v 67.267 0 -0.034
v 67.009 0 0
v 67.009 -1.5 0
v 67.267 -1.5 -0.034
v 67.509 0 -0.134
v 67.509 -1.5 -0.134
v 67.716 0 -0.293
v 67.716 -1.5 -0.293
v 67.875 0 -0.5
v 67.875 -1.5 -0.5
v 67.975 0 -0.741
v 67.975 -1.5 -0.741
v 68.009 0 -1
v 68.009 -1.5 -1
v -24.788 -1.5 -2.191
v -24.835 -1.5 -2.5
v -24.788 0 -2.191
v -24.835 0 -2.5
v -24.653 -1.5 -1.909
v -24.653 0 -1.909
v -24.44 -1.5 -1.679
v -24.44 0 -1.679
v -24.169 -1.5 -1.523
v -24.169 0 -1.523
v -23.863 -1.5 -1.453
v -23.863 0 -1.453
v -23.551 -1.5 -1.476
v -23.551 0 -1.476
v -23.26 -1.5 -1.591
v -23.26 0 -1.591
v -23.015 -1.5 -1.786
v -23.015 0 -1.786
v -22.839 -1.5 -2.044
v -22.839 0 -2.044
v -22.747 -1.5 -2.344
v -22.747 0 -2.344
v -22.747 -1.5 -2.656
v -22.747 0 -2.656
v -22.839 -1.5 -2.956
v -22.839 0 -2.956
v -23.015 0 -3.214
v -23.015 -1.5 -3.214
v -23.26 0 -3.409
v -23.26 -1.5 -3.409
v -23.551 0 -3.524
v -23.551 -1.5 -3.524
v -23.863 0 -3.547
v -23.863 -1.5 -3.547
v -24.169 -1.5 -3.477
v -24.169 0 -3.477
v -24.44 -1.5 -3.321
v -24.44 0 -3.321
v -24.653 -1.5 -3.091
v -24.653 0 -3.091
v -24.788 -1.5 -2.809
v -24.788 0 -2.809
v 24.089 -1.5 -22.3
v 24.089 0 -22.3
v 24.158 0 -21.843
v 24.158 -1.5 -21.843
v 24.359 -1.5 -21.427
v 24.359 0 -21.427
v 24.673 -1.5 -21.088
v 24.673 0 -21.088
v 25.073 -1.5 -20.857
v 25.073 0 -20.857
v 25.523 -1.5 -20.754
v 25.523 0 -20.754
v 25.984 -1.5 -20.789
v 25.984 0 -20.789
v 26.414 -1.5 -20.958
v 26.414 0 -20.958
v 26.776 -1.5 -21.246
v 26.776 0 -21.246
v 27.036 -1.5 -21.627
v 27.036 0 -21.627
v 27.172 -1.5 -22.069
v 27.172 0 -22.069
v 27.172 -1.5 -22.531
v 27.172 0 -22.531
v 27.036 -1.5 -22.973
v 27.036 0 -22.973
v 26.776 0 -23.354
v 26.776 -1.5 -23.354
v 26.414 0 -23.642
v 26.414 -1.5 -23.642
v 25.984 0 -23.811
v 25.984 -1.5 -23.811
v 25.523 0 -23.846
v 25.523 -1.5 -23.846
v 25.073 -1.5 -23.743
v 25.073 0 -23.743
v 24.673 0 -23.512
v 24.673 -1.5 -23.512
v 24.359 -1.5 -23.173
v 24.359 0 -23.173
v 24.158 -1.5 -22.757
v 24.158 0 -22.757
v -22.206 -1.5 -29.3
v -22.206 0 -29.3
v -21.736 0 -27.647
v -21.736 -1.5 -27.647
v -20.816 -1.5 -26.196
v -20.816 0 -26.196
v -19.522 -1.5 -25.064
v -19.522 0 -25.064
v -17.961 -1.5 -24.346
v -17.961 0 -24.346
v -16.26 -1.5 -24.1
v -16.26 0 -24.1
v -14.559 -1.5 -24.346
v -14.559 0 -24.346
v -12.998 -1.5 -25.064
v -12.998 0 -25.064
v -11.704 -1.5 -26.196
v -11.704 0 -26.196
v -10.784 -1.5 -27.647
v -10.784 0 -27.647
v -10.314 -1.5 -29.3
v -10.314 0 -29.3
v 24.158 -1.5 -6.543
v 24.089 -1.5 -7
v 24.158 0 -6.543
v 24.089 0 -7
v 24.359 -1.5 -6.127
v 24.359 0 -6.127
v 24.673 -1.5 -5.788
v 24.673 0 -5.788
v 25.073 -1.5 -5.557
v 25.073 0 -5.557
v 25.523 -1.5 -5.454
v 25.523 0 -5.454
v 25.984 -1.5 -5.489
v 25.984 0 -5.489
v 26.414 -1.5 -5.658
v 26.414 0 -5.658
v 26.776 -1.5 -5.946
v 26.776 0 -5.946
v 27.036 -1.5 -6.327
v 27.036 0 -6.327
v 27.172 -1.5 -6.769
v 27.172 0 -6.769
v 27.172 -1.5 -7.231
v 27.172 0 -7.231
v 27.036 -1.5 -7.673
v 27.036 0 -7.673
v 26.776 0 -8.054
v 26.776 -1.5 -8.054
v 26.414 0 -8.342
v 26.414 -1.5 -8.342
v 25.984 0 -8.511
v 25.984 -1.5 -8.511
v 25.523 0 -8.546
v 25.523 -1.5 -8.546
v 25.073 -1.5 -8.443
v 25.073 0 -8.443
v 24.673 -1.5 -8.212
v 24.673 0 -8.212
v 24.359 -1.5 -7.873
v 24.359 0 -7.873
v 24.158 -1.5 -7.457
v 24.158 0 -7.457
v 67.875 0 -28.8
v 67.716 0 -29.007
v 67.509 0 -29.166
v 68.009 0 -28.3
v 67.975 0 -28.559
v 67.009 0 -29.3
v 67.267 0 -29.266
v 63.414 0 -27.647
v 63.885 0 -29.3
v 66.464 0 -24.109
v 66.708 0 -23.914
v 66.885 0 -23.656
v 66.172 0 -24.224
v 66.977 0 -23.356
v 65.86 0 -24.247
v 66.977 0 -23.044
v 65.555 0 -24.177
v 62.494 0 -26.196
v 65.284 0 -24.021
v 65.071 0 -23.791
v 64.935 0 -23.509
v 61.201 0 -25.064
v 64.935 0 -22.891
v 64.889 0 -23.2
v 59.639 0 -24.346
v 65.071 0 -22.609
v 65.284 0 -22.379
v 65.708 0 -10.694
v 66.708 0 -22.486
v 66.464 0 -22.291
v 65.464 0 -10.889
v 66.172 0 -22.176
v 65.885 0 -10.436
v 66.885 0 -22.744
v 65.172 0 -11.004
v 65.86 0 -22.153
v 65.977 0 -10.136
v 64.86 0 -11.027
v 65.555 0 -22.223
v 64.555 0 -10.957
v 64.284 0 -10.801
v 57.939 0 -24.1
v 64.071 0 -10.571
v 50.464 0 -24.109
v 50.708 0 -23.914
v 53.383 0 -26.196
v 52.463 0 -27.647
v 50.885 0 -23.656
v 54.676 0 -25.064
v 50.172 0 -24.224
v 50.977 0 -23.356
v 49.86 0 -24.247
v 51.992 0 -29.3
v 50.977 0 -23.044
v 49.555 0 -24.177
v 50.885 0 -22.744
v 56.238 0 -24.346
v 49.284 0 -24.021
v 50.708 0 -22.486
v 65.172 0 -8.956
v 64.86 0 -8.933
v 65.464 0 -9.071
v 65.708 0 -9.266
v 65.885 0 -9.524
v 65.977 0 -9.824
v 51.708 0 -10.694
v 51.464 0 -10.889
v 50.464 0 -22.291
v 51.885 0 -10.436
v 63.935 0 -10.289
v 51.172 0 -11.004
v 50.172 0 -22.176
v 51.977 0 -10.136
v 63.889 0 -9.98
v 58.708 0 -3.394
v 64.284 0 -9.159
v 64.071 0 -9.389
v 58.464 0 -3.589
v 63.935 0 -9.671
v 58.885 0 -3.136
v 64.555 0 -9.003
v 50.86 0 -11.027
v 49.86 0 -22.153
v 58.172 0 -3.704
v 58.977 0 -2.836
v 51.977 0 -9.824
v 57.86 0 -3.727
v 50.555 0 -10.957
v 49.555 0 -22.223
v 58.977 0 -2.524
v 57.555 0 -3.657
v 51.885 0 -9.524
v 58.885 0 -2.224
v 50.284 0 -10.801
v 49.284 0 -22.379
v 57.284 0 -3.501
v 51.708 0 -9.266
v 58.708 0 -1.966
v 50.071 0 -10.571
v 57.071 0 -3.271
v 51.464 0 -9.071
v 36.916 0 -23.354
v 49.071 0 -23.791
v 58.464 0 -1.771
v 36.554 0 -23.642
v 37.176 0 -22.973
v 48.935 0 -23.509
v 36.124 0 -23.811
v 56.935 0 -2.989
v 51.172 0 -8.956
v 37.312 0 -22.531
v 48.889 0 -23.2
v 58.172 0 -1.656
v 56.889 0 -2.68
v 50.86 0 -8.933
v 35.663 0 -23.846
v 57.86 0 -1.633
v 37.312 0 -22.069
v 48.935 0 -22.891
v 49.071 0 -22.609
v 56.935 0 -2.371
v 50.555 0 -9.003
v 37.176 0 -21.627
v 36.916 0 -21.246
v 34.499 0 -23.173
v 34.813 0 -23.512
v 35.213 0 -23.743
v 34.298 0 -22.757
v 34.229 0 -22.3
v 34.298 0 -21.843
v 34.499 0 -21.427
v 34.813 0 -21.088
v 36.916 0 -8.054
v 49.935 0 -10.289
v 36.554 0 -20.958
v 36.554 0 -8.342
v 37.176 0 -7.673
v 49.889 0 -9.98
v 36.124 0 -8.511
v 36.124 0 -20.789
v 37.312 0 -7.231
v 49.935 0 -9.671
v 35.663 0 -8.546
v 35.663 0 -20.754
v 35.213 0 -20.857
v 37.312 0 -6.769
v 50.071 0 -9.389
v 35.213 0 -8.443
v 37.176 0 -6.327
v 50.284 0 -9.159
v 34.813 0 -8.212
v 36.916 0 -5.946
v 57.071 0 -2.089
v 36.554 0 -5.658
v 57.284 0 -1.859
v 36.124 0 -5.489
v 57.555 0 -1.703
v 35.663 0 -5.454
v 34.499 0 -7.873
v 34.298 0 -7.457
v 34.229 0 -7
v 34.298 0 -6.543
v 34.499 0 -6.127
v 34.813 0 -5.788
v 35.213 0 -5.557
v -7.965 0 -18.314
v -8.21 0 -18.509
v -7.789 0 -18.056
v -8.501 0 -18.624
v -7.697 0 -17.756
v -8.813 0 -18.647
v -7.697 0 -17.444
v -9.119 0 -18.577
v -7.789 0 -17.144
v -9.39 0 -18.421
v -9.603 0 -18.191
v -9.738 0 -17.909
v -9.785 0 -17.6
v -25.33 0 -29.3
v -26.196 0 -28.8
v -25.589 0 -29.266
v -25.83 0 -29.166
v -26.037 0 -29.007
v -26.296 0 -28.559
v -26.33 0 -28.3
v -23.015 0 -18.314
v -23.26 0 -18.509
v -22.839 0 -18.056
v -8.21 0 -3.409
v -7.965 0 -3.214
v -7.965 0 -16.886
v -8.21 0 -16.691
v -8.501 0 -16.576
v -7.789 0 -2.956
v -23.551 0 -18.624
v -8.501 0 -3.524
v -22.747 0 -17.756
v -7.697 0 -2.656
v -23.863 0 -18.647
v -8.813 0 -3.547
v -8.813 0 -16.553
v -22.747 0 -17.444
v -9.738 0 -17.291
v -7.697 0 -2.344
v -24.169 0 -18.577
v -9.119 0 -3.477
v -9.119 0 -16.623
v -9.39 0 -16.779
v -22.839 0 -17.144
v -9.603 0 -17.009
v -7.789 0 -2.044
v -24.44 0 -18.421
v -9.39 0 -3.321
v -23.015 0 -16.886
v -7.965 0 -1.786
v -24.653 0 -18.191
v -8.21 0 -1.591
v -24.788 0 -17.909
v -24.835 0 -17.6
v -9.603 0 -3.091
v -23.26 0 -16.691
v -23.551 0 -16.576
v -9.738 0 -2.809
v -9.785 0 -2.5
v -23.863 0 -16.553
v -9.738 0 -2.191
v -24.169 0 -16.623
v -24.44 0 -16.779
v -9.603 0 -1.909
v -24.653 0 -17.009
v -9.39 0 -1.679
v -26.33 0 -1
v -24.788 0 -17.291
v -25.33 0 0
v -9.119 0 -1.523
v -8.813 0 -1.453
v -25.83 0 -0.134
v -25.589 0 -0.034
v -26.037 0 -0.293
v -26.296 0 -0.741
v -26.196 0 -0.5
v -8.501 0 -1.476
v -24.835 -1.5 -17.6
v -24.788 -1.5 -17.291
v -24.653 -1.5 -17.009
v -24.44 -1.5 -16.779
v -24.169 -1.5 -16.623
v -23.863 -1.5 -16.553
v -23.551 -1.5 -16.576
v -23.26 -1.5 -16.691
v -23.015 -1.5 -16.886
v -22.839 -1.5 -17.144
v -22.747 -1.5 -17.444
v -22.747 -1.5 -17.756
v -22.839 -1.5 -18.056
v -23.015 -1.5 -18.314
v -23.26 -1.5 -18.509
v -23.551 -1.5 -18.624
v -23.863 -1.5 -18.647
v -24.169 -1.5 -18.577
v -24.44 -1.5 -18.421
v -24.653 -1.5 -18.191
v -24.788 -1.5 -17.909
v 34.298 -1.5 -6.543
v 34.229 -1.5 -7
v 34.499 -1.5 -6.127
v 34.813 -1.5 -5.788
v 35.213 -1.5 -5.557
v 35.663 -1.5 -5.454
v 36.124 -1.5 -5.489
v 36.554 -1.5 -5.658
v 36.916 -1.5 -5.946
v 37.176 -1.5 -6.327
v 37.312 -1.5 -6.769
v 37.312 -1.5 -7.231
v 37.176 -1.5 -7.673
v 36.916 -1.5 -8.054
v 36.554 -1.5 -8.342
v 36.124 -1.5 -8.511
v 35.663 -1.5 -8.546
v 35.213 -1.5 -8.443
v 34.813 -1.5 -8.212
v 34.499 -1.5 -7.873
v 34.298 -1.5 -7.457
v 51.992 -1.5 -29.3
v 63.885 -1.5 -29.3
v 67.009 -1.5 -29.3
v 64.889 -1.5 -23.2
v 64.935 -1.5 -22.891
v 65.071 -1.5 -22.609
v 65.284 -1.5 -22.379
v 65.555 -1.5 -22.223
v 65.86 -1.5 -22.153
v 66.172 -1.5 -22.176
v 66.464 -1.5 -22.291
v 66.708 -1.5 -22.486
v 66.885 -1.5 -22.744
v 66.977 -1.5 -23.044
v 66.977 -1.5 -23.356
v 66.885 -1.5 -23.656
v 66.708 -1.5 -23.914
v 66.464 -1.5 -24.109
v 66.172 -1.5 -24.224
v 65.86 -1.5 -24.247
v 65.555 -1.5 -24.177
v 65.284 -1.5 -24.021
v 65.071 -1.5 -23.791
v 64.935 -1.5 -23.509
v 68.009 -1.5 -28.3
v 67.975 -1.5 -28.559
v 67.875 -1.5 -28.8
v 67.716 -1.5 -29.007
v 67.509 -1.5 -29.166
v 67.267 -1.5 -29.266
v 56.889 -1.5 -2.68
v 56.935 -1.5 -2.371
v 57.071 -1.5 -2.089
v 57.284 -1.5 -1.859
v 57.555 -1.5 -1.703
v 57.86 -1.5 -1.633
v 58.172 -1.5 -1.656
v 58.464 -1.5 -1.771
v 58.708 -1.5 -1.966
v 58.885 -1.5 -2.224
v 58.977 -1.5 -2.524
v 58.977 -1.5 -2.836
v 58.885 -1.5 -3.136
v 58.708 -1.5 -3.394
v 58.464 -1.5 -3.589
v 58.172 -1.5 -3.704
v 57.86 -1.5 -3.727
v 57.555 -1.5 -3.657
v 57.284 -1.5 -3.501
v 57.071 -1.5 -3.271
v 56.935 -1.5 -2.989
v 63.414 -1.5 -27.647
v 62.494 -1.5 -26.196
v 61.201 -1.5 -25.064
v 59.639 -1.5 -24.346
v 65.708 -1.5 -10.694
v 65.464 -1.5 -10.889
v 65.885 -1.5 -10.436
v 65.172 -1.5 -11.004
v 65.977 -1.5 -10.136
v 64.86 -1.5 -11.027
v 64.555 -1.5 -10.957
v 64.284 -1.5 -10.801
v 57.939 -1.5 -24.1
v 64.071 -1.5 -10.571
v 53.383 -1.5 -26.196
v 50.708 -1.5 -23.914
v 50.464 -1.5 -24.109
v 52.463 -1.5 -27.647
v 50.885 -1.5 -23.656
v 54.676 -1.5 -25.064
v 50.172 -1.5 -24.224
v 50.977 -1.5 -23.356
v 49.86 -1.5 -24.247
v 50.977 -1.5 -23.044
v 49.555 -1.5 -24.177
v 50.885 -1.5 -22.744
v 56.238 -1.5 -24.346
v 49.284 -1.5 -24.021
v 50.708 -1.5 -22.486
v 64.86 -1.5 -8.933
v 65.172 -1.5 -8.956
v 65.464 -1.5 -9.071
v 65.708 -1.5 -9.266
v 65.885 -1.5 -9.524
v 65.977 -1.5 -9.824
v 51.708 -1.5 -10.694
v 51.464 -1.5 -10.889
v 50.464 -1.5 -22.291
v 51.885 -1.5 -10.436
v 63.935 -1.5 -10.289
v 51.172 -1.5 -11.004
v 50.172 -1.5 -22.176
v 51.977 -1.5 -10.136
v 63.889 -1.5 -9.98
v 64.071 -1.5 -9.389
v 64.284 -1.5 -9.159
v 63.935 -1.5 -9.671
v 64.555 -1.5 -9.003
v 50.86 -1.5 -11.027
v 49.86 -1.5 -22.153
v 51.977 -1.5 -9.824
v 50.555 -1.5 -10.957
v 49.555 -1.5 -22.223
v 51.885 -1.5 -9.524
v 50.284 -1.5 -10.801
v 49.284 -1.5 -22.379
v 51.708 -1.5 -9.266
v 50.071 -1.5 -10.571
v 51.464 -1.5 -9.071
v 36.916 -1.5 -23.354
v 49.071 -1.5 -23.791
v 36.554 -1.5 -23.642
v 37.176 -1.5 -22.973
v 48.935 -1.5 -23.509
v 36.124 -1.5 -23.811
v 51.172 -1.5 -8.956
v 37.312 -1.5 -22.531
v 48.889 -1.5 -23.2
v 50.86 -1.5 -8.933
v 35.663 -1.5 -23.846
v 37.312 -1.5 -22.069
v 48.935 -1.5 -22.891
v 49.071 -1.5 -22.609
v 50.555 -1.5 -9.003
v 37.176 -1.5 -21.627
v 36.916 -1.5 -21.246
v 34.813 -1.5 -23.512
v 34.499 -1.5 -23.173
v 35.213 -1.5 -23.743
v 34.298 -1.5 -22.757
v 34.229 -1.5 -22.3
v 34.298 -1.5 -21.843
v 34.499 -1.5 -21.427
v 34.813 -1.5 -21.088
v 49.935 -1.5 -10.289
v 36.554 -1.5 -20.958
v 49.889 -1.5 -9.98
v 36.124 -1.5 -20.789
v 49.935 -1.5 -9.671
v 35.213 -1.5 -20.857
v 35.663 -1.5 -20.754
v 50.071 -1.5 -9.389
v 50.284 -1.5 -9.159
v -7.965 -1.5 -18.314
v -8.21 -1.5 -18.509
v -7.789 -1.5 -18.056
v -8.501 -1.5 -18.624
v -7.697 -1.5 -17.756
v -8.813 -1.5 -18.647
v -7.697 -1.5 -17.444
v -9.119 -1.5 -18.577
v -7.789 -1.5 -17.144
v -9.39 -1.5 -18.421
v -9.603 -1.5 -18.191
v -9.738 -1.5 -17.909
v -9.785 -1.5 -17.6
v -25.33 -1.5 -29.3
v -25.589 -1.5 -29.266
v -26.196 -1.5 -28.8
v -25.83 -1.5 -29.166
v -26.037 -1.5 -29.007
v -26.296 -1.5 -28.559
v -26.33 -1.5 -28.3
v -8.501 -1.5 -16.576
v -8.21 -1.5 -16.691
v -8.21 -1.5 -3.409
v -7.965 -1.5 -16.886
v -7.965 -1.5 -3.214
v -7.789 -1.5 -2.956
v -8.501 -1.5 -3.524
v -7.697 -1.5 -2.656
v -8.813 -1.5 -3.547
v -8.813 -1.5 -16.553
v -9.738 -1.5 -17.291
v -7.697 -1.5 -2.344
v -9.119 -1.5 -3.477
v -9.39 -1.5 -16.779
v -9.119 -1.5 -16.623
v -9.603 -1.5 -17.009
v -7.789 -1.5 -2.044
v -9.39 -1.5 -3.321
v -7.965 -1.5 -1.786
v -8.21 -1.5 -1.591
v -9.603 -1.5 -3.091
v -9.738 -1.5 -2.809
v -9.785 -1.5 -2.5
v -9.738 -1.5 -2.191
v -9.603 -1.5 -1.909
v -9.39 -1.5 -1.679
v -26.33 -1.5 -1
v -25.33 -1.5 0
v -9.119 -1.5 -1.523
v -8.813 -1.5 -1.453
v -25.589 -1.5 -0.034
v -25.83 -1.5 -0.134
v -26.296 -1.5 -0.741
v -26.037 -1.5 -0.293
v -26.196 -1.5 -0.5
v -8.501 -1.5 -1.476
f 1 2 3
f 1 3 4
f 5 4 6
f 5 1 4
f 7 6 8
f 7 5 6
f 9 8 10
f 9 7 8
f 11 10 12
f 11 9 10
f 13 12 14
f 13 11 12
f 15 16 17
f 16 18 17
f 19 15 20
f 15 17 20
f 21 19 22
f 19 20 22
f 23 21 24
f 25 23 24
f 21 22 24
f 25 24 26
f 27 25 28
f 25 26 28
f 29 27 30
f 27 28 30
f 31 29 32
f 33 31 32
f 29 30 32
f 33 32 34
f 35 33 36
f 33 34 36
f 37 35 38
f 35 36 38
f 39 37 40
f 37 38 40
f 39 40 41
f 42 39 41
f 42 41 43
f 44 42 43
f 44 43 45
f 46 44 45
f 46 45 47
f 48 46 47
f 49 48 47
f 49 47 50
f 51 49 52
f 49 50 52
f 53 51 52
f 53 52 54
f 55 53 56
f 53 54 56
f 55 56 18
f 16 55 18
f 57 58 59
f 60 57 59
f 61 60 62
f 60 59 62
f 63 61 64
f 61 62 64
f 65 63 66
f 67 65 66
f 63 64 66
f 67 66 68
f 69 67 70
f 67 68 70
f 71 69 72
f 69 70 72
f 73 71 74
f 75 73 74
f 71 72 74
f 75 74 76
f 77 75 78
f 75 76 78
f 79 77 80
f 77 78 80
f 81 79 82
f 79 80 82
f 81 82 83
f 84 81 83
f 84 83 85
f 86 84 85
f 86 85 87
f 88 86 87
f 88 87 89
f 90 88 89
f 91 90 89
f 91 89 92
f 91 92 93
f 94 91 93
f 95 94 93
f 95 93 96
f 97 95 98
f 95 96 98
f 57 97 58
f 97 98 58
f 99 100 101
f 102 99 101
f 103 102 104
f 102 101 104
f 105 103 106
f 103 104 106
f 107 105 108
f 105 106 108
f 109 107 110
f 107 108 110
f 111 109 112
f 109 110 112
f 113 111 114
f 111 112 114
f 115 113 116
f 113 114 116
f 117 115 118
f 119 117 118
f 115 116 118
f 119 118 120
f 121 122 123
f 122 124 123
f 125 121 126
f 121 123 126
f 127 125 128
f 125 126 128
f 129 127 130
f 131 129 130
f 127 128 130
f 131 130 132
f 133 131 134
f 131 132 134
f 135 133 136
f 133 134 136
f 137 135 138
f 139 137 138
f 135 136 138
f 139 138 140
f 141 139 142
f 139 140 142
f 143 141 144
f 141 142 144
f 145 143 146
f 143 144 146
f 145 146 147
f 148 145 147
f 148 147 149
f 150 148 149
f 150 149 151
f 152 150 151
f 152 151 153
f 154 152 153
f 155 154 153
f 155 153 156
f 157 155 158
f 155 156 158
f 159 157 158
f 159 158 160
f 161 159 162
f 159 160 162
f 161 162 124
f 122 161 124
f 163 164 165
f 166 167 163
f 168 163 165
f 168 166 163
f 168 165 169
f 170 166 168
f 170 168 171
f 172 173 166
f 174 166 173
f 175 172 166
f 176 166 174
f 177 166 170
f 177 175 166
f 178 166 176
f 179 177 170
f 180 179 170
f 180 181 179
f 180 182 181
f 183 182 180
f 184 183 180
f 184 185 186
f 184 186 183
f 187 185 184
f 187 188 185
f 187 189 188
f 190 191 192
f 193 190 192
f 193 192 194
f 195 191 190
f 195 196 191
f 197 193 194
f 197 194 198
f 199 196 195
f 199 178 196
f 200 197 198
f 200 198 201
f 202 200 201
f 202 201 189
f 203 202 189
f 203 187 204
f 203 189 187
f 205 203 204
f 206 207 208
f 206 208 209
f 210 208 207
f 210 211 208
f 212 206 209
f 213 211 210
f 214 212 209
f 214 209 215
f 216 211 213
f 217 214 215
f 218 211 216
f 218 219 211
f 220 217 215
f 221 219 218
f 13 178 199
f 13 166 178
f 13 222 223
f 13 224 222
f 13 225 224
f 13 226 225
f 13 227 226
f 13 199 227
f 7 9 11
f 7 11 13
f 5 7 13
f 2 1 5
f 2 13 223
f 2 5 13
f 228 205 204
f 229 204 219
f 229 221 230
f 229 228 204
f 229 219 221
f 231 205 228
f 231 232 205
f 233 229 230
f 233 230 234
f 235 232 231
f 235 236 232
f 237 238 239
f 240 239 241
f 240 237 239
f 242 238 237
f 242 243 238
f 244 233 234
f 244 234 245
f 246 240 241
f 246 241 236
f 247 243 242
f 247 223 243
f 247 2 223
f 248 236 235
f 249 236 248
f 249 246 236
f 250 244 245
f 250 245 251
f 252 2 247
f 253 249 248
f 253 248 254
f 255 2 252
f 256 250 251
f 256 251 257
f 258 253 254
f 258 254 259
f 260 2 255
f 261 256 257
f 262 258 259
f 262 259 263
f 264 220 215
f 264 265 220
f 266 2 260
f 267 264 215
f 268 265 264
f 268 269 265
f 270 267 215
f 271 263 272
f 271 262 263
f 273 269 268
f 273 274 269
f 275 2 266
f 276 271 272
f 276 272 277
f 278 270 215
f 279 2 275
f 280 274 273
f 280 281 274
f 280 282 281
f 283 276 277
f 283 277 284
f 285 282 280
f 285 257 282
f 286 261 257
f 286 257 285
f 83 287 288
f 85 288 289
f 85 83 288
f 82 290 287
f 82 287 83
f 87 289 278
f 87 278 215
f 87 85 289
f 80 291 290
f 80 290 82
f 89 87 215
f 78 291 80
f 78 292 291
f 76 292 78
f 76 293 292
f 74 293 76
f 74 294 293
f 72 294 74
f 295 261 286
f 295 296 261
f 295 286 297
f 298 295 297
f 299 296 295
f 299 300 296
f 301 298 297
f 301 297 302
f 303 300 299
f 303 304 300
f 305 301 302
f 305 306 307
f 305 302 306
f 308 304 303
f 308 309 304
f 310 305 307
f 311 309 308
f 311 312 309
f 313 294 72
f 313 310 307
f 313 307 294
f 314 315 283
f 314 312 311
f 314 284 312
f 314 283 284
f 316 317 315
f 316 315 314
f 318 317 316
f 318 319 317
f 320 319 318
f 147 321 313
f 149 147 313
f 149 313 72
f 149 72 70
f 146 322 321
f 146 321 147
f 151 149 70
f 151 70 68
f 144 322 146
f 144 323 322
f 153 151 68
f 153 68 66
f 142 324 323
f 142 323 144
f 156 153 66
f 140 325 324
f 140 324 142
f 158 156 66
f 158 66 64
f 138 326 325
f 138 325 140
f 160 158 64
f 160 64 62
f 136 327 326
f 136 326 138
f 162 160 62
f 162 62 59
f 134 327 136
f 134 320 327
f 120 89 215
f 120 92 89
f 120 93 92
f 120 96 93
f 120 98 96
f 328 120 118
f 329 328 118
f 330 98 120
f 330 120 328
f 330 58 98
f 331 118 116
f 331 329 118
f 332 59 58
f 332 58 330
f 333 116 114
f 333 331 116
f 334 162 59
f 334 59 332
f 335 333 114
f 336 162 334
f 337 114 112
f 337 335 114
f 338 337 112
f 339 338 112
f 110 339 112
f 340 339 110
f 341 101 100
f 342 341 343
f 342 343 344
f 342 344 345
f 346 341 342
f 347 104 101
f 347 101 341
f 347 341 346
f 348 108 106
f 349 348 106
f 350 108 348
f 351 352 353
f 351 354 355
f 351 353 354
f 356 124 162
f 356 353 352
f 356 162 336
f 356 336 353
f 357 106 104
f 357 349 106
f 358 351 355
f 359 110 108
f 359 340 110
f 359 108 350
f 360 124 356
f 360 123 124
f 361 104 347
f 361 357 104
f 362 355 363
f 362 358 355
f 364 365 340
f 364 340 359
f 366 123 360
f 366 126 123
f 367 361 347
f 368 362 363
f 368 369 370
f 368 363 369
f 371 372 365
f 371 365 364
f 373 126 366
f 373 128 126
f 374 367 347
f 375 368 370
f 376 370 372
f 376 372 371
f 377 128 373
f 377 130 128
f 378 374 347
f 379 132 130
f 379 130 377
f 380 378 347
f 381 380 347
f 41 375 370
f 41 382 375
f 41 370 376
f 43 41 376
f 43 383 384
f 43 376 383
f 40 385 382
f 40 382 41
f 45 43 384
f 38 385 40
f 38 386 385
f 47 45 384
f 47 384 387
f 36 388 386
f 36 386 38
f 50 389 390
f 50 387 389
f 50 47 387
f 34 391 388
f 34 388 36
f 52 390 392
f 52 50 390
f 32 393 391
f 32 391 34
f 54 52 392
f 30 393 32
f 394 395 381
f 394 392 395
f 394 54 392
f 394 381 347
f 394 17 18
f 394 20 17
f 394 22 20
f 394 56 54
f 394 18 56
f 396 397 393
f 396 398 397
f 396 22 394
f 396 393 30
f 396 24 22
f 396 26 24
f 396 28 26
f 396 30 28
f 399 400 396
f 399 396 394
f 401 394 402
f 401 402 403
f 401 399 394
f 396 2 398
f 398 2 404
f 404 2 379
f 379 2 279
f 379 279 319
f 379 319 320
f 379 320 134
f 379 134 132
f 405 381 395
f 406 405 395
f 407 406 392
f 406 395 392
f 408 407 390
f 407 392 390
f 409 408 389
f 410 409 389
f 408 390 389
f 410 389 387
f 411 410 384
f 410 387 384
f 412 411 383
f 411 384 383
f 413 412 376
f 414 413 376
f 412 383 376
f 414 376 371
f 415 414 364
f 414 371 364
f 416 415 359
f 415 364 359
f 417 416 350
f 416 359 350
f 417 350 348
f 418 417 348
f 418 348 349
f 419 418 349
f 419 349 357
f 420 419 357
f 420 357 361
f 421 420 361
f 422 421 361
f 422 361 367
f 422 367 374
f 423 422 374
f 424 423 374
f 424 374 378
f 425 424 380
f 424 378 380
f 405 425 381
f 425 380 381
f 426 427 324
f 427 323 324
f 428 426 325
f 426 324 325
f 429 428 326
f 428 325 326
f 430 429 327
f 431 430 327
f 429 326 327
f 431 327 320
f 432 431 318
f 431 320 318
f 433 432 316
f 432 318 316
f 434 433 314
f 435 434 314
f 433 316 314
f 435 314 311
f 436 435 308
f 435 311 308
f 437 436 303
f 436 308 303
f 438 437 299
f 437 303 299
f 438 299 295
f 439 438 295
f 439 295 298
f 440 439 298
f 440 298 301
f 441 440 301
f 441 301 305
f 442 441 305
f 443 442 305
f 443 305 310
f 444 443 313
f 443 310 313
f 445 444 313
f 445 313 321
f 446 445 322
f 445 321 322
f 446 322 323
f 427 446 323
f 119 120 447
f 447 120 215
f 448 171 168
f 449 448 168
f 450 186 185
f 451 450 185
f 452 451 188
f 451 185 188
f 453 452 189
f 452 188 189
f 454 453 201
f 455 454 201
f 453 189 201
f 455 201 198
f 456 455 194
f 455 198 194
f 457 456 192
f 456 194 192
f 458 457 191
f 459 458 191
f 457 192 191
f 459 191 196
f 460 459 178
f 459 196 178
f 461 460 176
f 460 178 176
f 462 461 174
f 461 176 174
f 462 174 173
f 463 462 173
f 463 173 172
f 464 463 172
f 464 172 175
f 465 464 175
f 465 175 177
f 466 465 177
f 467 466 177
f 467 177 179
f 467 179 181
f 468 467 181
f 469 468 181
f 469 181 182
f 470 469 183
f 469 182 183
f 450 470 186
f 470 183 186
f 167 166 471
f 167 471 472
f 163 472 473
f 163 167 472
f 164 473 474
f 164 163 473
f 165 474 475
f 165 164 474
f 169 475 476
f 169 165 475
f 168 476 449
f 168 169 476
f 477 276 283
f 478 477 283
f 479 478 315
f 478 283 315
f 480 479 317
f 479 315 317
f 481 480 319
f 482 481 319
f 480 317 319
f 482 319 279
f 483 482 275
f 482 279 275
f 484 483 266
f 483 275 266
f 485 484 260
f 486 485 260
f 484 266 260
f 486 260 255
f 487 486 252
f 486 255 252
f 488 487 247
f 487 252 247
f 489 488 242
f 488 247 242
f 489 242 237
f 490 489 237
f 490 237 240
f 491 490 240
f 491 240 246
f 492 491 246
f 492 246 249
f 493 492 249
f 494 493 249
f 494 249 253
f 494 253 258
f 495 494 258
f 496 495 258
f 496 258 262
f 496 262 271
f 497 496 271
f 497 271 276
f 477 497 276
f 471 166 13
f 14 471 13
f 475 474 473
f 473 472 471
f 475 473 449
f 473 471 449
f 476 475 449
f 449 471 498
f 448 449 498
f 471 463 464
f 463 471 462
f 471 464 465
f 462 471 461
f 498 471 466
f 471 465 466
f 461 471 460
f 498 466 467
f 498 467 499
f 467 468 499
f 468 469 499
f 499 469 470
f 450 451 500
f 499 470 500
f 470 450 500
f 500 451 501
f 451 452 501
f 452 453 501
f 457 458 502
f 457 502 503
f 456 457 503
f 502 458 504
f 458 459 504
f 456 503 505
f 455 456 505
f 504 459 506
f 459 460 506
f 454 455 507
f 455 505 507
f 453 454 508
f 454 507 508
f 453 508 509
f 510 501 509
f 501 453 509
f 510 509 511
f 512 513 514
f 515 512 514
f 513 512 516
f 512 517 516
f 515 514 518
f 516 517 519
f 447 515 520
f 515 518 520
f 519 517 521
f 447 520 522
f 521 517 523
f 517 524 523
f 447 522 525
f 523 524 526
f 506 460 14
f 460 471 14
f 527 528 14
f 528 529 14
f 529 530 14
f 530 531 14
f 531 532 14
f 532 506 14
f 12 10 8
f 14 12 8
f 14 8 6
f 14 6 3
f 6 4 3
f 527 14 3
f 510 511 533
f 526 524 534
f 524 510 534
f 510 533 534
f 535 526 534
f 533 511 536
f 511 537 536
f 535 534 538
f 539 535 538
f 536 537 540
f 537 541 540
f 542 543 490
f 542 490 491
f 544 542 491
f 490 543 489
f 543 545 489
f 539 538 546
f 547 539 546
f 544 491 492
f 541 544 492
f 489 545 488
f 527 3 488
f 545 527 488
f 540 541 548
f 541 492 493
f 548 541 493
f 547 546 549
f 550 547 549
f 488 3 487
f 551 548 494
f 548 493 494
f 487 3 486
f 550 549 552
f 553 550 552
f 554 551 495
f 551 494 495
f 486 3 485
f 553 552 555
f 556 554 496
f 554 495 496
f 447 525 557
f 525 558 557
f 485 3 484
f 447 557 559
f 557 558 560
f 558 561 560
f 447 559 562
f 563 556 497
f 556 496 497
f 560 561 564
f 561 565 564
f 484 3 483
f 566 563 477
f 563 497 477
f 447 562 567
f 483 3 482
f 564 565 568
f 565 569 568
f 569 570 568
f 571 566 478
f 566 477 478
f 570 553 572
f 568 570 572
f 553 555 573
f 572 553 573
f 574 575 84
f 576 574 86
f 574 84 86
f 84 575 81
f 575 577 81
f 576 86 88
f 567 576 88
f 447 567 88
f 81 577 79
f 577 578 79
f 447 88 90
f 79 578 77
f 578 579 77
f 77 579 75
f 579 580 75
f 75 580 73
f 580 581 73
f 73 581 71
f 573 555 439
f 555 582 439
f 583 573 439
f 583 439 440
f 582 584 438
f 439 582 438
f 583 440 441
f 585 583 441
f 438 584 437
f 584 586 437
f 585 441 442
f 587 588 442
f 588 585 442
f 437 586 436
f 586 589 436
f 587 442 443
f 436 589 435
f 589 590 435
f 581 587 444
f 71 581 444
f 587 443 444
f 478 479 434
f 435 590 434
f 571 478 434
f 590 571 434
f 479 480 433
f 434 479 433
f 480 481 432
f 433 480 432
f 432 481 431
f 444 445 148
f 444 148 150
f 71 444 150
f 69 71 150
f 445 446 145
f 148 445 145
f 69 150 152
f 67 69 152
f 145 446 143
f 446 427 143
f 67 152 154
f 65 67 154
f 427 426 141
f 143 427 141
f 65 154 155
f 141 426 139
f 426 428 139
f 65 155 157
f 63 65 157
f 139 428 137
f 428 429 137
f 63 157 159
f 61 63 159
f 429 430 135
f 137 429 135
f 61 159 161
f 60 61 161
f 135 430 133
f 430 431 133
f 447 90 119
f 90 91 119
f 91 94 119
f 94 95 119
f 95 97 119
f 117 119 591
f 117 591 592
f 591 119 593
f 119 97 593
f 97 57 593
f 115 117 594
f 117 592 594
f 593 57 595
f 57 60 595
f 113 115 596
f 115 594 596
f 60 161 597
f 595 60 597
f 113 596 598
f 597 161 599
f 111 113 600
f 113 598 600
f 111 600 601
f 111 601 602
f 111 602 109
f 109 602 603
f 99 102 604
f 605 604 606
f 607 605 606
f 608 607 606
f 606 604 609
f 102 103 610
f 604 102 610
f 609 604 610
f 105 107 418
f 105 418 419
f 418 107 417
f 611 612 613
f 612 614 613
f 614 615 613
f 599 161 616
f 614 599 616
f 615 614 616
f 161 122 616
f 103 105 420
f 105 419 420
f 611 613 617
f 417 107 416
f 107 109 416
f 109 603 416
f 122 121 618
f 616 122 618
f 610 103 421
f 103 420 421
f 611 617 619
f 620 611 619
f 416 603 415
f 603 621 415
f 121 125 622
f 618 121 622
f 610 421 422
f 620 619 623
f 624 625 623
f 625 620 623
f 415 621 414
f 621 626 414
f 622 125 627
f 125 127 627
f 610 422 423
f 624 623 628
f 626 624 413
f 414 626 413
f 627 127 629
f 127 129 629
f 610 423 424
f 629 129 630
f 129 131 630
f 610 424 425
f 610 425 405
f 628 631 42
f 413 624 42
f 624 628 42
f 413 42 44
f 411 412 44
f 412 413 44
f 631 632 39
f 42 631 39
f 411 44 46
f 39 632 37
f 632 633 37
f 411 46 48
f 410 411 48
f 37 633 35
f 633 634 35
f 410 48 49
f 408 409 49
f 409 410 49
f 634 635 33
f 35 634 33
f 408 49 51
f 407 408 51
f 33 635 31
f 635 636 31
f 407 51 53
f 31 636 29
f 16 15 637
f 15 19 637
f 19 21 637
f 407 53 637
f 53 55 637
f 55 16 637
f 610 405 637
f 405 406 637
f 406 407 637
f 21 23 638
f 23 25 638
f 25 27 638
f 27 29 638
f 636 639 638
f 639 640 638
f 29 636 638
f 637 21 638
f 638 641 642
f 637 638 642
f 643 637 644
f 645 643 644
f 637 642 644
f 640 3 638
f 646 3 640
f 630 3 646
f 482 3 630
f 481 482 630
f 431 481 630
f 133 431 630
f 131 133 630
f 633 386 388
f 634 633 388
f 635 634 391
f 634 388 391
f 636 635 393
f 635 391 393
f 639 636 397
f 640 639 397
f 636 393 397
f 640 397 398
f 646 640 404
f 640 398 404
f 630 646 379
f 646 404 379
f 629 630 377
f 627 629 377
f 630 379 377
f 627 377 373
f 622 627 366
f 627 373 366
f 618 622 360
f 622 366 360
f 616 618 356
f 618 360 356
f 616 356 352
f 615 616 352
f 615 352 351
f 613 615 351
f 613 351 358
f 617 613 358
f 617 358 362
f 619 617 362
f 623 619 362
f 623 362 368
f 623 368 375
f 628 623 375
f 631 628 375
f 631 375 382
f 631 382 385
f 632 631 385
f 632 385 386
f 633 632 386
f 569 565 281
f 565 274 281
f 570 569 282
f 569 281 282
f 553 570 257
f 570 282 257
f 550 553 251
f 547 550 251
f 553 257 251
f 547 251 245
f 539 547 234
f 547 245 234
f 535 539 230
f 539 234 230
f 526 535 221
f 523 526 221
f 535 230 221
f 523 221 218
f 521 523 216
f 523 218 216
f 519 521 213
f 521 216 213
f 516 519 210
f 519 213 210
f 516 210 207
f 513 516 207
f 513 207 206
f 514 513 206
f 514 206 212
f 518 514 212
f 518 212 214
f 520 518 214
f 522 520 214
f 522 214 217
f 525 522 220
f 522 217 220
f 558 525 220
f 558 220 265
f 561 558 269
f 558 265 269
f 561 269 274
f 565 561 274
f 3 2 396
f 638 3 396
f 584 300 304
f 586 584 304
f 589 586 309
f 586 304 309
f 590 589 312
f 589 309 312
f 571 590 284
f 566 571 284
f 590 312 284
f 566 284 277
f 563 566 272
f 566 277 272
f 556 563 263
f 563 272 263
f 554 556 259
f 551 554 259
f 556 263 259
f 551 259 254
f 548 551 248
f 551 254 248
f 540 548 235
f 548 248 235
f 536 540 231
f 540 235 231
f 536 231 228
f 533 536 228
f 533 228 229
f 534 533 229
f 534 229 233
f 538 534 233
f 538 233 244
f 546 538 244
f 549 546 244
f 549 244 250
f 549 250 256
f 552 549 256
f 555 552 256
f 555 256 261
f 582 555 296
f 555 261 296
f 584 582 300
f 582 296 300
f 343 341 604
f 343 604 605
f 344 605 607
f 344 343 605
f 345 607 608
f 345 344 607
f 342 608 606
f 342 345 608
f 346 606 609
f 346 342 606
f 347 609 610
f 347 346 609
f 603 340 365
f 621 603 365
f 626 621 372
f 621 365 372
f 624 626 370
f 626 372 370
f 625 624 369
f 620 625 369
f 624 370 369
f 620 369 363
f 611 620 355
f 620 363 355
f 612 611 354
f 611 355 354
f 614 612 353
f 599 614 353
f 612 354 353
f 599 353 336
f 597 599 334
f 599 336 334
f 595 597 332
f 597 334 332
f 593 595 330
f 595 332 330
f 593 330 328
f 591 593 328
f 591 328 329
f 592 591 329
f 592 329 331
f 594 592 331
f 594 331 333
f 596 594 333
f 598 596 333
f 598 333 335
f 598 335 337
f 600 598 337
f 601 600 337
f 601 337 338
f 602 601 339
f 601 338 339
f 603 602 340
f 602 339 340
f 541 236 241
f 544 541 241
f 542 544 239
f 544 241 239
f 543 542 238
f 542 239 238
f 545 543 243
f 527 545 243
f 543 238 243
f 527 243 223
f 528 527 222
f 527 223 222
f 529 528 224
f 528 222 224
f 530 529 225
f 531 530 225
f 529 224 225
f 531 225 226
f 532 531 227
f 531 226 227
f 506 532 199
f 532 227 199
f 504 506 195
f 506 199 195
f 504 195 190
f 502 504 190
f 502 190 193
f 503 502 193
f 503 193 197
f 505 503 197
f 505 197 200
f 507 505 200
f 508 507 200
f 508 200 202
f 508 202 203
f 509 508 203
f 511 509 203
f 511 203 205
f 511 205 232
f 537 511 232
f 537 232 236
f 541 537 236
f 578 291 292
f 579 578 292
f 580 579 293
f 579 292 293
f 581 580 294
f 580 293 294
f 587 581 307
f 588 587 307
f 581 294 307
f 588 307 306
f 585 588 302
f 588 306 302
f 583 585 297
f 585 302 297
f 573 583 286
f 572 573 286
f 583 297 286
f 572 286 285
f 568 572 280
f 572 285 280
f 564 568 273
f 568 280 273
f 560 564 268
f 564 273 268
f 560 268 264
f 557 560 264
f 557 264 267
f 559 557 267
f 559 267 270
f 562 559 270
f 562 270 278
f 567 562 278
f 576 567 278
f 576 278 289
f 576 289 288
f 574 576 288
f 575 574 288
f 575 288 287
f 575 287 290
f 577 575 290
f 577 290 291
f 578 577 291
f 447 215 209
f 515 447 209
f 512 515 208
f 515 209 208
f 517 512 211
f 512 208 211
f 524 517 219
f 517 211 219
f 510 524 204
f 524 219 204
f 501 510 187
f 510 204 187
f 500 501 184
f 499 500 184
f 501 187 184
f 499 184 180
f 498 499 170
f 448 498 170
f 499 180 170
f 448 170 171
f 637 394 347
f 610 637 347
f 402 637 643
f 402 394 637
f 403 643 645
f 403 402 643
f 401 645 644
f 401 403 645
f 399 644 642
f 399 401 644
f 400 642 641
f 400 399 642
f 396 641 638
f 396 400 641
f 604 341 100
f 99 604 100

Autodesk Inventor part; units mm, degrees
ref_plane "YZ Plane" through (0, 0, 0) normal (1, 0, 0) x (0, 1, 0)
ref_plane "XZ Plane" through (0, 0, 0) normal (0, 1, 0) x (-1, 0, 0)
ref_plane "XY Plane" through (0, 0, 0) normal (0, 0, 1) x (1, 0, 0)
sketch "Sketch1" plane through (0, 0, 0) normal (0, 1, 0) x (-1, 0, 0)
  line L0 (-0.4496, -29.3) -> (-0.4496, 0)
  line L1 (-41.2289, 0) -> (-41.2289, -29.3)
  circle A0 centre (-49.9386, -23.2) radius 1.05
  circle A1 centre (-50.9386, -9.98) radius 1.05
  circle A2 centre (-57.9386, -2.68) radius 1.05
  circle A3 centre (-64.9386, -9.98) radius 1.05
  circle A4 centre (-65.9386, -23.2) radius 1.05
  circle A5 centre (23.785, -2.5) radius 1.05
  circle A6 centre (8.735, -2.5) radius 1.05
  circle A7 centre (23.785, -17.6) radius 1.05
  circle A8 centre (8.735, -17.6) radius 1.05
  circle A9 centre (-25.6393, -7) radius 1.55
  circle A10 centre (-35.7793, -7) radius 1.55
  circle A11 centre (-25.6393, -22.3) radius 1.55
  circle A12 centre (-35.7793, -22.3) radius 1.55
  arc A13 (-67.0086, 0) -> (-68.0086, -1) centre (-67.0086, -1) ccw
  line L2 (-67.0086, 0) -> (25.33, 0)
  line L3 (-68.0086, -28.3) -> (-68.0086, -1)
  arc A14 (-68.0086, -28.3) -> (-67.0086, -29.3) centre (-67.0086, -28.3) ccw
  line L4 (-63.885, -29.3) -> (-67.0086, -29.3)
  arc A15 (-51.9921, -29.3) -> (-63.885, -29.3) centre (-57.9386, -30.1) ccw
  line L5 (10.3136, -29.3) -> (-51.9921, -29.3)
  arc A16 (22.2064, -29.3) -> (10.3136, -29.3) centre (16.26, -30.1) ccw
  line L6 (25.33, -29.3) -> (22.2064, -29.3)
  arc A17 (25.33, -29.3) -> (26.33, -28.3) centre (25.33, -28.3) ccw
  line L7 (26.33, -1) -> (26.33, -28.3)
  arc A18 (26.33, -1) -> (25.33, 0) centre (25.33, -1) ccw
  line L8 (-41.6786, -29.3) -> (-41.6786, 0)
  line L9 (-40.7793, 0) -> (-40.7793, -29.3)
  line L10 (-0.8993, -29.3) -> (-0.8993, 0)
  line L11 (0, 0) -> (0, -29.3)
  point P0 (0, 0)
extrude "Extrusion1" add sketch "Sketch1" against normal blind 1.5
properties part number "axis_22_bottom_frame"
